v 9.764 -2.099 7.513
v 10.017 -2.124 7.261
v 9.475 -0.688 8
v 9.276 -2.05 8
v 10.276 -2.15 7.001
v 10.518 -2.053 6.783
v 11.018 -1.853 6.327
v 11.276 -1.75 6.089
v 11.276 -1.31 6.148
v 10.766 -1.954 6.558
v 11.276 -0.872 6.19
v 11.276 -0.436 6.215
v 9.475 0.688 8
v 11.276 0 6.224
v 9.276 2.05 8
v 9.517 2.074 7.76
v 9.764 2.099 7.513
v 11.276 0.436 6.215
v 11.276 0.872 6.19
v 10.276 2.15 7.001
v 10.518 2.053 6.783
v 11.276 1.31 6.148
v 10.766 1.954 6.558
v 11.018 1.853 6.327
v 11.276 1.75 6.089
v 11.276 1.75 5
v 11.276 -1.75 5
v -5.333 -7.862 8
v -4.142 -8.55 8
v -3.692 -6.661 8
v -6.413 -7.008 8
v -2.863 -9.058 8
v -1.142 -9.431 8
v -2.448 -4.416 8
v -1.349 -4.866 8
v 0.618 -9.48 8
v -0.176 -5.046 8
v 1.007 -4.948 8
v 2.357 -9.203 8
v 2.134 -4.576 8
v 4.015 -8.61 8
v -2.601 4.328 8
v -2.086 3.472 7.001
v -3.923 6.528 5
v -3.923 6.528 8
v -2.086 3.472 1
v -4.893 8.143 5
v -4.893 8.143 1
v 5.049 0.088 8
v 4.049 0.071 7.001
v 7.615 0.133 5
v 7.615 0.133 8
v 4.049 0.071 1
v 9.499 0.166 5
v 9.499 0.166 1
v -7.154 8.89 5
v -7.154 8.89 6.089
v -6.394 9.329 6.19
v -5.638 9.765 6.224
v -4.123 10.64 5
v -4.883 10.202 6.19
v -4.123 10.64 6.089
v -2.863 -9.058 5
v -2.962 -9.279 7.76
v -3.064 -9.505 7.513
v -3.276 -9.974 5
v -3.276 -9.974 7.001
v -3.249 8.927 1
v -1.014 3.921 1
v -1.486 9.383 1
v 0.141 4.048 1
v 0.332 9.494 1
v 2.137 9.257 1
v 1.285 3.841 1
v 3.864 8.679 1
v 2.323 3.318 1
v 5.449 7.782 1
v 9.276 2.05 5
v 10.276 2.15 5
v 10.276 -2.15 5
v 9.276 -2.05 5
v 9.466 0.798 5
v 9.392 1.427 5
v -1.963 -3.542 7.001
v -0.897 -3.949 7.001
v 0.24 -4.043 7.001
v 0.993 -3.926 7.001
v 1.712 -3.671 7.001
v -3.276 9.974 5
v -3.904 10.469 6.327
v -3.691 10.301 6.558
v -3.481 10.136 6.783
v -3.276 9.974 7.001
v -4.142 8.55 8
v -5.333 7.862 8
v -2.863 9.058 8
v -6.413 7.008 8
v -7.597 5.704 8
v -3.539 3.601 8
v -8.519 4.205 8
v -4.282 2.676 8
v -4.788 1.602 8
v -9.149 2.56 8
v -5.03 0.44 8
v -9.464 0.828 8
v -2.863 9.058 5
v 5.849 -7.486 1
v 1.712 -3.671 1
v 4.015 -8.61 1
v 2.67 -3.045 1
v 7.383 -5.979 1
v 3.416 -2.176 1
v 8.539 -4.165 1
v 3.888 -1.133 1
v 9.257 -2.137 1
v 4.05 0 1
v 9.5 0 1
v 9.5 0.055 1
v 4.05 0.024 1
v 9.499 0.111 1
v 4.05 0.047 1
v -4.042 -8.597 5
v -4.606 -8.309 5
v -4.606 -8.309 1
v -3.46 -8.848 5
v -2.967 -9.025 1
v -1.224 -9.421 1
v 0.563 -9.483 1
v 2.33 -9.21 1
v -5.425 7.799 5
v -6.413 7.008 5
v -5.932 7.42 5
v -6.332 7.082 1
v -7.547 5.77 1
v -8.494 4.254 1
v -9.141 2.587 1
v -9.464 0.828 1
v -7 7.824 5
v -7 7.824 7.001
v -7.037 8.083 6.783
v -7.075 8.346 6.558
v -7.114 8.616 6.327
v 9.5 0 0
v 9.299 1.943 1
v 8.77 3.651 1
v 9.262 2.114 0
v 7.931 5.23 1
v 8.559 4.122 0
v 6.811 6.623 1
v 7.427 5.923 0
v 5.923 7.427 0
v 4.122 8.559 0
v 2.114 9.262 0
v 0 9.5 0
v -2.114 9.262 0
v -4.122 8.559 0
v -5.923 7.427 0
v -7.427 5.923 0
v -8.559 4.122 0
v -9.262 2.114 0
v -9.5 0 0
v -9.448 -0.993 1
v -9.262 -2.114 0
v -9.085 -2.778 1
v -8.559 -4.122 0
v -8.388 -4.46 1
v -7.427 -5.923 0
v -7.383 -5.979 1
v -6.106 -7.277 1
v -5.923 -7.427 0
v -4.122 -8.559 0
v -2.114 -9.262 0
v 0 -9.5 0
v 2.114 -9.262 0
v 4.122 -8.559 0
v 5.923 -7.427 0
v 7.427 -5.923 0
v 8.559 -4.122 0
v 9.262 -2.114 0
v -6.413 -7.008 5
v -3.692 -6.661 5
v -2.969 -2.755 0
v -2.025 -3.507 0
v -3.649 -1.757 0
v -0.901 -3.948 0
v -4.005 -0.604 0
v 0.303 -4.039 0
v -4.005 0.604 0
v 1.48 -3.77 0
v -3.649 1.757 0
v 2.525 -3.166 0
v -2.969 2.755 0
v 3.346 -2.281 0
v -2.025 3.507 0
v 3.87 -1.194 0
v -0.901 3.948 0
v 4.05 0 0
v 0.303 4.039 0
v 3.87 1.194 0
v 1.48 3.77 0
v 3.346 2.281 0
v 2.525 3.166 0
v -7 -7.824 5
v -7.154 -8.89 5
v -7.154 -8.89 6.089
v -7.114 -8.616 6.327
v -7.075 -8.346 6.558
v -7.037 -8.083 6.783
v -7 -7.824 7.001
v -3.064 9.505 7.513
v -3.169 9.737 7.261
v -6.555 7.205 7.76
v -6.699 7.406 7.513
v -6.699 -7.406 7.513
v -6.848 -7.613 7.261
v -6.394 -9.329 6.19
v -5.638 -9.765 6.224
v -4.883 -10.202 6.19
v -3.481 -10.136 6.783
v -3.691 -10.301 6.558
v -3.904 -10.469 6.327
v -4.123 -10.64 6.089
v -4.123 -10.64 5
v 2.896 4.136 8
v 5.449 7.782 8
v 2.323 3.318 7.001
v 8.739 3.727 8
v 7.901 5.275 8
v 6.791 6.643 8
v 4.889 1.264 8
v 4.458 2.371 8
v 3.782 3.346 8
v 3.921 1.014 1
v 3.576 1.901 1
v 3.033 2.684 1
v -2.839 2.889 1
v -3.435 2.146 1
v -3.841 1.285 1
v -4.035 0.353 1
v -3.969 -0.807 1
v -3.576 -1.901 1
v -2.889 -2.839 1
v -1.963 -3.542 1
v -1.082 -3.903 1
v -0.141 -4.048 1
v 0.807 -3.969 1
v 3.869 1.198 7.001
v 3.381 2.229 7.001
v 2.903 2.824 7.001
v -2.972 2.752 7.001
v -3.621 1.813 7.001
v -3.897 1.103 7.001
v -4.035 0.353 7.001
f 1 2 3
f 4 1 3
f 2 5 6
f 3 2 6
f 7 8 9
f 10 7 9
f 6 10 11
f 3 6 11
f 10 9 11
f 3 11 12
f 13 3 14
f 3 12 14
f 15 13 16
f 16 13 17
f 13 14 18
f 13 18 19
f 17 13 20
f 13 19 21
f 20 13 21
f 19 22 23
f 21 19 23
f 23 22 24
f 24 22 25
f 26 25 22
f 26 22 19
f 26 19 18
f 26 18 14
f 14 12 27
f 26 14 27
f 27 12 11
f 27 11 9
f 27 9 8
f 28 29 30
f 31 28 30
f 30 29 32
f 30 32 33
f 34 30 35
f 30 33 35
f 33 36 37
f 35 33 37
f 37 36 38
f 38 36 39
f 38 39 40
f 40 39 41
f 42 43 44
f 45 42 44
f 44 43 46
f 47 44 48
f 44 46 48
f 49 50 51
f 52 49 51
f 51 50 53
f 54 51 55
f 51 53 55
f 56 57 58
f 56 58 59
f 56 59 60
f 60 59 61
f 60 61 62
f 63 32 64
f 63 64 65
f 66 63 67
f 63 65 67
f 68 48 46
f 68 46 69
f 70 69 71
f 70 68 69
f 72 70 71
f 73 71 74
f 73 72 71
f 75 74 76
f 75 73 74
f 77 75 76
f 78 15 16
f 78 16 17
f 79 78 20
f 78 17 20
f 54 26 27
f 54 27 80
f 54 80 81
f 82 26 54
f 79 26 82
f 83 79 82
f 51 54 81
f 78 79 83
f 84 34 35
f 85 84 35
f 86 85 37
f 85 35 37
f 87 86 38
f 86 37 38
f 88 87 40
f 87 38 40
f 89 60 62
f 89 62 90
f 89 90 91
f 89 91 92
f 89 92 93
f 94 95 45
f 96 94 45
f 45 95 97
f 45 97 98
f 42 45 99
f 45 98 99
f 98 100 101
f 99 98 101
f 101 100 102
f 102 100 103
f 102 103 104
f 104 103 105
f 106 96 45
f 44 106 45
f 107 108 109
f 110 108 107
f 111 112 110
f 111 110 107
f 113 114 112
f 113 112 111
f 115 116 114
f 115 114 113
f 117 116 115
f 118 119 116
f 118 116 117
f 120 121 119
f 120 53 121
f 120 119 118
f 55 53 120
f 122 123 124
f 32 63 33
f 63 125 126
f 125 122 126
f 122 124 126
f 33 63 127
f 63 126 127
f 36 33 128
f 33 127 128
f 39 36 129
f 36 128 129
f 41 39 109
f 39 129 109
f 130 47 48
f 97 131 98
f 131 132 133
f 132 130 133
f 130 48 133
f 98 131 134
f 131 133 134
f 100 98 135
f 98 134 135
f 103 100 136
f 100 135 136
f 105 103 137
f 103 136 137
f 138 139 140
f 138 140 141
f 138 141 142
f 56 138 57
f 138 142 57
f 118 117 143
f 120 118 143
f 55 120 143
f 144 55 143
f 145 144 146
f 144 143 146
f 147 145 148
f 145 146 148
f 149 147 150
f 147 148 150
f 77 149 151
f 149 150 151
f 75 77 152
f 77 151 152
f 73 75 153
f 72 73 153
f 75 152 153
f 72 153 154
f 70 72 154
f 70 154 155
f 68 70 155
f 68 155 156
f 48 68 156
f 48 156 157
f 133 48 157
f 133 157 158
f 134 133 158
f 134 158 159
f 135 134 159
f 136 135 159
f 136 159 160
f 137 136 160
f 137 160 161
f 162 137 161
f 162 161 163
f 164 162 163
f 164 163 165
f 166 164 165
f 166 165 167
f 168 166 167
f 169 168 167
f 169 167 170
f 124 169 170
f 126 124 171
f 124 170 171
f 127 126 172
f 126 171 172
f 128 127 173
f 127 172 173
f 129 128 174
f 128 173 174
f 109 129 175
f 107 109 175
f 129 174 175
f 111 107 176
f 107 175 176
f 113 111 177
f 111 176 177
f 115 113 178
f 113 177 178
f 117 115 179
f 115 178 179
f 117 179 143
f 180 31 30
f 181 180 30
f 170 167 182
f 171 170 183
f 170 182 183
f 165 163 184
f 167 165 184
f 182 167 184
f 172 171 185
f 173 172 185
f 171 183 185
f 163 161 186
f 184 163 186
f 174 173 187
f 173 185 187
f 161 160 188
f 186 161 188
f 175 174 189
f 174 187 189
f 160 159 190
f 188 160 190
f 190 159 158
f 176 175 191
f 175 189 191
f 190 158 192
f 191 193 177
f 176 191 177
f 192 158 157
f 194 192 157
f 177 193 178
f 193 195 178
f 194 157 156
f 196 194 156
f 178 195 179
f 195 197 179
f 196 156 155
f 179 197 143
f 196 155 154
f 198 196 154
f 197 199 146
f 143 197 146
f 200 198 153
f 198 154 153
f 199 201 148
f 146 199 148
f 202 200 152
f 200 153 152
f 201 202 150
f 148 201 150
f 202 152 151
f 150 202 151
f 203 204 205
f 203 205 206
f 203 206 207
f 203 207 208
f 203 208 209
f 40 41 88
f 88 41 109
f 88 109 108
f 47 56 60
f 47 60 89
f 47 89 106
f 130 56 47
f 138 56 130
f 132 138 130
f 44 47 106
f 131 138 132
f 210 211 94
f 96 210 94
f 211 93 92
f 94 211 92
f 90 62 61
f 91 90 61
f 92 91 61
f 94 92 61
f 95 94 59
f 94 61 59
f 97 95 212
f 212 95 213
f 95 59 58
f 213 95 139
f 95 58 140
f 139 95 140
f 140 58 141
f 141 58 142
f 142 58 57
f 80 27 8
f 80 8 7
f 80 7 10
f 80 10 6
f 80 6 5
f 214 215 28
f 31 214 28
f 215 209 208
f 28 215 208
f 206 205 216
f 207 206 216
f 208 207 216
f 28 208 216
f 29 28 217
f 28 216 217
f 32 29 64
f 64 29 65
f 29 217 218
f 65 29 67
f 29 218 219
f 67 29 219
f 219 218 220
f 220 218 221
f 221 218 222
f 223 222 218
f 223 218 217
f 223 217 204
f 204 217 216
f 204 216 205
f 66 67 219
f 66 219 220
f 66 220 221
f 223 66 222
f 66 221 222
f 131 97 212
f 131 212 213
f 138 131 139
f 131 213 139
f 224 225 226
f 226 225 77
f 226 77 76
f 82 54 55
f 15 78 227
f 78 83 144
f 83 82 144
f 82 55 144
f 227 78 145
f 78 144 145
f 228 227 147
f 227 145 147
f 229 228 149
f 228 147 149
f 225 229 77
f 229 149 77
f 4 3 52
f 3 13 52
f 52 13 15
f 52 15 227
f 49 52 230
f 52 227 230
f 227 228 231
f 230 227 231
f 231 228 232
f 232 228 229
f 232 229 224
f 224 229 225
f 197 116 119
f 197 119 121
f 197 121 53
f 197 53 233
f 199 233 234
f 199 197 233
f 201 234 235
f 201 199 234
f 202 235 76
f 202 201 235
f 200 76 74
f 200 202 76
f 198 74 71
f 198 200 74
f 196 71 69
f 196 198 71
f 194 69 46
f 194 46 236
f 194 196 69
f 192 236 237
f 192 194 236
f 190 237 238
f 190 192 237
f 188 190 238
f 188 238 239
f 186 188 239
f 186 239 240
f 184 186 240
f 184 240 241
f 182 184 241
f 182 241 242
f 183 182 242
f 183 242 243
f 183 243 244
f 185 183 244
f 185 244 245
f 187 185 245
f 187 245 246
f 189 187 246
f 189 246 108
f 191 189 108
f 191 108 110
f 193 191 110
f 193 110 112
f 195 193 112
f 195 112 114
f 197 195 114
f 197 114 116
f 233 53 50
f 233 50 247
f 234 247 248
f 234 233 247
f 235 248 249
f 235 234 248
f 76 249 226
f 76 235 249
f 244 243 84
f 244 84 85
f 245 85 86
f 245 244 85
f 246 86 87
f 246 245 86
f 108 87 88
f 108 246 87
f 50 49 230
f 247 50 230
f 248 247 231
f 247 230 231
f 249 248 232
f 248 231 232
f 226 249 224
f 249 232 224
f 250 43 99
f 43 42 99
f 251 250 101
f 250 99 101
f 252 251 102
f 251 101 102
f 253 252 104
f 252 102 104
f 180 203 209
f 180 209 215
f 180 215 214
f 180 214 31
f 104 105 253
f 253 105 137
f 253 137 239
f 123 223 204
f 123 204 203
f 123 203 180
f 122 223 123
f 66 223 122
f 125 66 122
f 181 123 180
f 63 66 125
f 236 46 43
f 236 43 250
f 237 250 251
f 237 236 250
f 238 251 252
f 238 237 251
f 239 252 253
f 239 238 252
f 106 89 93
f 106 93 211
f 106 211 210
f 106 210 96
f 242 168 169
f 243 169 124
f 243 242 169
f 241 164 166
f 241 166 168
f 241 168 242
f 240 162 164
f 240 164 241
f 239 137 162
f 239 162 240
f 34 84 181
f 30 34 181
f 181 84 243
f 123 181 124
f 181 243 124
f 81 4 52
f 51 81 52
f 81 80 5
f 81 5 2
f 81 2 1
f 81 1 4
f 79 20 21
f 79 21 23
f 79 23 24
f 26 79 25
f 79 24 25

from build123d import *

# Parameters (mm, degrees)
SKETCH002_R        = 9.5
SKETCH002_R_2      = 4.05
PAD_DEPTH          = 1
PAD001_DEPTH       = 7
PAD002_DEPTH       = 3
POLARPATTERN_COUNT = 3


with BuildPart() as part:
    # Sketch002 → Pad (new body)
    with BuildSketch(Plane.XY):
        Circle(SKETCH002_R)
        Circle(SKETCH002_R_2, mode=Mode.SUBTRACT)
    extrude(amount=PAD_DEPTH)

    # Sketch003 (on Face4 of Pad) → Pad001 (join)
    with BuildSketch(Plane.XY.offset(1)):
        with BuildLine():
            ThreePointArc((4.0493831654, 0.0706822461), (3.5759377511, 1.9013598293), (2.3229845672, 3.3175657794))
            Line((5.4489761453, 7.7819444208), (2.3229845672, 3.3175657794))
            ThreePointArc((9.498553104, 0.1657978612), (8.3880021321, 4.4599798465), (5.4489761453, 7.7819444208))
            Line((4.0493831654, 0.0706822461), (9.498553104, 0.1657978612))
        make_face()
    pad001 = extrude(amount=PAD001_DEPTH)

    # Sketch004 (on Face8 of Pad001) → Pad002 (join)
    with BuildSketch(Plane.XY.offset(8)):
        Polygon((9.2761791703, 2.05), (10.2761791703, 2.15), (11.2761791703, 1.75), (11.2761791703, -1.75), (10.2761791703, -2.15), (9.2761791703, -2.05), (7.6151685504, 0.1329232615), align=None)
    pad002 = extrude(amount=-PAD002_DEPTH)

    # PolarPattern: Pad001, Pad002 ×3 about axis
    polarpattern_axis = Axis((0, 0, 1), (0, 0, 1))
    for i in range(1, POLARPATTERN_COUNT):
        add(pad001.rotate(polarpattern_axis, i * 360 / POLARPATTERN_COUNT))
        add(pad002.rotate(polarpattern_axis, i * 360 / POLARPATTERN_COUNT))

    # Sketch005 → Groove (revolve, cut)
    with BuildSketch(Plane.XZ):
        Polygon((3.0493831654, 11.2253084173), (3.0493831654, 6), (7.2746915827, 10.2253084173), (12.2761791703, 5.2238208297), (12.2761791703, 11.2253084173), align=None)
    revolve(axis=Axis((0, 0, 0), (0, 0, 1)), mode=Mode.SUBTRACT)


solid = part.part
